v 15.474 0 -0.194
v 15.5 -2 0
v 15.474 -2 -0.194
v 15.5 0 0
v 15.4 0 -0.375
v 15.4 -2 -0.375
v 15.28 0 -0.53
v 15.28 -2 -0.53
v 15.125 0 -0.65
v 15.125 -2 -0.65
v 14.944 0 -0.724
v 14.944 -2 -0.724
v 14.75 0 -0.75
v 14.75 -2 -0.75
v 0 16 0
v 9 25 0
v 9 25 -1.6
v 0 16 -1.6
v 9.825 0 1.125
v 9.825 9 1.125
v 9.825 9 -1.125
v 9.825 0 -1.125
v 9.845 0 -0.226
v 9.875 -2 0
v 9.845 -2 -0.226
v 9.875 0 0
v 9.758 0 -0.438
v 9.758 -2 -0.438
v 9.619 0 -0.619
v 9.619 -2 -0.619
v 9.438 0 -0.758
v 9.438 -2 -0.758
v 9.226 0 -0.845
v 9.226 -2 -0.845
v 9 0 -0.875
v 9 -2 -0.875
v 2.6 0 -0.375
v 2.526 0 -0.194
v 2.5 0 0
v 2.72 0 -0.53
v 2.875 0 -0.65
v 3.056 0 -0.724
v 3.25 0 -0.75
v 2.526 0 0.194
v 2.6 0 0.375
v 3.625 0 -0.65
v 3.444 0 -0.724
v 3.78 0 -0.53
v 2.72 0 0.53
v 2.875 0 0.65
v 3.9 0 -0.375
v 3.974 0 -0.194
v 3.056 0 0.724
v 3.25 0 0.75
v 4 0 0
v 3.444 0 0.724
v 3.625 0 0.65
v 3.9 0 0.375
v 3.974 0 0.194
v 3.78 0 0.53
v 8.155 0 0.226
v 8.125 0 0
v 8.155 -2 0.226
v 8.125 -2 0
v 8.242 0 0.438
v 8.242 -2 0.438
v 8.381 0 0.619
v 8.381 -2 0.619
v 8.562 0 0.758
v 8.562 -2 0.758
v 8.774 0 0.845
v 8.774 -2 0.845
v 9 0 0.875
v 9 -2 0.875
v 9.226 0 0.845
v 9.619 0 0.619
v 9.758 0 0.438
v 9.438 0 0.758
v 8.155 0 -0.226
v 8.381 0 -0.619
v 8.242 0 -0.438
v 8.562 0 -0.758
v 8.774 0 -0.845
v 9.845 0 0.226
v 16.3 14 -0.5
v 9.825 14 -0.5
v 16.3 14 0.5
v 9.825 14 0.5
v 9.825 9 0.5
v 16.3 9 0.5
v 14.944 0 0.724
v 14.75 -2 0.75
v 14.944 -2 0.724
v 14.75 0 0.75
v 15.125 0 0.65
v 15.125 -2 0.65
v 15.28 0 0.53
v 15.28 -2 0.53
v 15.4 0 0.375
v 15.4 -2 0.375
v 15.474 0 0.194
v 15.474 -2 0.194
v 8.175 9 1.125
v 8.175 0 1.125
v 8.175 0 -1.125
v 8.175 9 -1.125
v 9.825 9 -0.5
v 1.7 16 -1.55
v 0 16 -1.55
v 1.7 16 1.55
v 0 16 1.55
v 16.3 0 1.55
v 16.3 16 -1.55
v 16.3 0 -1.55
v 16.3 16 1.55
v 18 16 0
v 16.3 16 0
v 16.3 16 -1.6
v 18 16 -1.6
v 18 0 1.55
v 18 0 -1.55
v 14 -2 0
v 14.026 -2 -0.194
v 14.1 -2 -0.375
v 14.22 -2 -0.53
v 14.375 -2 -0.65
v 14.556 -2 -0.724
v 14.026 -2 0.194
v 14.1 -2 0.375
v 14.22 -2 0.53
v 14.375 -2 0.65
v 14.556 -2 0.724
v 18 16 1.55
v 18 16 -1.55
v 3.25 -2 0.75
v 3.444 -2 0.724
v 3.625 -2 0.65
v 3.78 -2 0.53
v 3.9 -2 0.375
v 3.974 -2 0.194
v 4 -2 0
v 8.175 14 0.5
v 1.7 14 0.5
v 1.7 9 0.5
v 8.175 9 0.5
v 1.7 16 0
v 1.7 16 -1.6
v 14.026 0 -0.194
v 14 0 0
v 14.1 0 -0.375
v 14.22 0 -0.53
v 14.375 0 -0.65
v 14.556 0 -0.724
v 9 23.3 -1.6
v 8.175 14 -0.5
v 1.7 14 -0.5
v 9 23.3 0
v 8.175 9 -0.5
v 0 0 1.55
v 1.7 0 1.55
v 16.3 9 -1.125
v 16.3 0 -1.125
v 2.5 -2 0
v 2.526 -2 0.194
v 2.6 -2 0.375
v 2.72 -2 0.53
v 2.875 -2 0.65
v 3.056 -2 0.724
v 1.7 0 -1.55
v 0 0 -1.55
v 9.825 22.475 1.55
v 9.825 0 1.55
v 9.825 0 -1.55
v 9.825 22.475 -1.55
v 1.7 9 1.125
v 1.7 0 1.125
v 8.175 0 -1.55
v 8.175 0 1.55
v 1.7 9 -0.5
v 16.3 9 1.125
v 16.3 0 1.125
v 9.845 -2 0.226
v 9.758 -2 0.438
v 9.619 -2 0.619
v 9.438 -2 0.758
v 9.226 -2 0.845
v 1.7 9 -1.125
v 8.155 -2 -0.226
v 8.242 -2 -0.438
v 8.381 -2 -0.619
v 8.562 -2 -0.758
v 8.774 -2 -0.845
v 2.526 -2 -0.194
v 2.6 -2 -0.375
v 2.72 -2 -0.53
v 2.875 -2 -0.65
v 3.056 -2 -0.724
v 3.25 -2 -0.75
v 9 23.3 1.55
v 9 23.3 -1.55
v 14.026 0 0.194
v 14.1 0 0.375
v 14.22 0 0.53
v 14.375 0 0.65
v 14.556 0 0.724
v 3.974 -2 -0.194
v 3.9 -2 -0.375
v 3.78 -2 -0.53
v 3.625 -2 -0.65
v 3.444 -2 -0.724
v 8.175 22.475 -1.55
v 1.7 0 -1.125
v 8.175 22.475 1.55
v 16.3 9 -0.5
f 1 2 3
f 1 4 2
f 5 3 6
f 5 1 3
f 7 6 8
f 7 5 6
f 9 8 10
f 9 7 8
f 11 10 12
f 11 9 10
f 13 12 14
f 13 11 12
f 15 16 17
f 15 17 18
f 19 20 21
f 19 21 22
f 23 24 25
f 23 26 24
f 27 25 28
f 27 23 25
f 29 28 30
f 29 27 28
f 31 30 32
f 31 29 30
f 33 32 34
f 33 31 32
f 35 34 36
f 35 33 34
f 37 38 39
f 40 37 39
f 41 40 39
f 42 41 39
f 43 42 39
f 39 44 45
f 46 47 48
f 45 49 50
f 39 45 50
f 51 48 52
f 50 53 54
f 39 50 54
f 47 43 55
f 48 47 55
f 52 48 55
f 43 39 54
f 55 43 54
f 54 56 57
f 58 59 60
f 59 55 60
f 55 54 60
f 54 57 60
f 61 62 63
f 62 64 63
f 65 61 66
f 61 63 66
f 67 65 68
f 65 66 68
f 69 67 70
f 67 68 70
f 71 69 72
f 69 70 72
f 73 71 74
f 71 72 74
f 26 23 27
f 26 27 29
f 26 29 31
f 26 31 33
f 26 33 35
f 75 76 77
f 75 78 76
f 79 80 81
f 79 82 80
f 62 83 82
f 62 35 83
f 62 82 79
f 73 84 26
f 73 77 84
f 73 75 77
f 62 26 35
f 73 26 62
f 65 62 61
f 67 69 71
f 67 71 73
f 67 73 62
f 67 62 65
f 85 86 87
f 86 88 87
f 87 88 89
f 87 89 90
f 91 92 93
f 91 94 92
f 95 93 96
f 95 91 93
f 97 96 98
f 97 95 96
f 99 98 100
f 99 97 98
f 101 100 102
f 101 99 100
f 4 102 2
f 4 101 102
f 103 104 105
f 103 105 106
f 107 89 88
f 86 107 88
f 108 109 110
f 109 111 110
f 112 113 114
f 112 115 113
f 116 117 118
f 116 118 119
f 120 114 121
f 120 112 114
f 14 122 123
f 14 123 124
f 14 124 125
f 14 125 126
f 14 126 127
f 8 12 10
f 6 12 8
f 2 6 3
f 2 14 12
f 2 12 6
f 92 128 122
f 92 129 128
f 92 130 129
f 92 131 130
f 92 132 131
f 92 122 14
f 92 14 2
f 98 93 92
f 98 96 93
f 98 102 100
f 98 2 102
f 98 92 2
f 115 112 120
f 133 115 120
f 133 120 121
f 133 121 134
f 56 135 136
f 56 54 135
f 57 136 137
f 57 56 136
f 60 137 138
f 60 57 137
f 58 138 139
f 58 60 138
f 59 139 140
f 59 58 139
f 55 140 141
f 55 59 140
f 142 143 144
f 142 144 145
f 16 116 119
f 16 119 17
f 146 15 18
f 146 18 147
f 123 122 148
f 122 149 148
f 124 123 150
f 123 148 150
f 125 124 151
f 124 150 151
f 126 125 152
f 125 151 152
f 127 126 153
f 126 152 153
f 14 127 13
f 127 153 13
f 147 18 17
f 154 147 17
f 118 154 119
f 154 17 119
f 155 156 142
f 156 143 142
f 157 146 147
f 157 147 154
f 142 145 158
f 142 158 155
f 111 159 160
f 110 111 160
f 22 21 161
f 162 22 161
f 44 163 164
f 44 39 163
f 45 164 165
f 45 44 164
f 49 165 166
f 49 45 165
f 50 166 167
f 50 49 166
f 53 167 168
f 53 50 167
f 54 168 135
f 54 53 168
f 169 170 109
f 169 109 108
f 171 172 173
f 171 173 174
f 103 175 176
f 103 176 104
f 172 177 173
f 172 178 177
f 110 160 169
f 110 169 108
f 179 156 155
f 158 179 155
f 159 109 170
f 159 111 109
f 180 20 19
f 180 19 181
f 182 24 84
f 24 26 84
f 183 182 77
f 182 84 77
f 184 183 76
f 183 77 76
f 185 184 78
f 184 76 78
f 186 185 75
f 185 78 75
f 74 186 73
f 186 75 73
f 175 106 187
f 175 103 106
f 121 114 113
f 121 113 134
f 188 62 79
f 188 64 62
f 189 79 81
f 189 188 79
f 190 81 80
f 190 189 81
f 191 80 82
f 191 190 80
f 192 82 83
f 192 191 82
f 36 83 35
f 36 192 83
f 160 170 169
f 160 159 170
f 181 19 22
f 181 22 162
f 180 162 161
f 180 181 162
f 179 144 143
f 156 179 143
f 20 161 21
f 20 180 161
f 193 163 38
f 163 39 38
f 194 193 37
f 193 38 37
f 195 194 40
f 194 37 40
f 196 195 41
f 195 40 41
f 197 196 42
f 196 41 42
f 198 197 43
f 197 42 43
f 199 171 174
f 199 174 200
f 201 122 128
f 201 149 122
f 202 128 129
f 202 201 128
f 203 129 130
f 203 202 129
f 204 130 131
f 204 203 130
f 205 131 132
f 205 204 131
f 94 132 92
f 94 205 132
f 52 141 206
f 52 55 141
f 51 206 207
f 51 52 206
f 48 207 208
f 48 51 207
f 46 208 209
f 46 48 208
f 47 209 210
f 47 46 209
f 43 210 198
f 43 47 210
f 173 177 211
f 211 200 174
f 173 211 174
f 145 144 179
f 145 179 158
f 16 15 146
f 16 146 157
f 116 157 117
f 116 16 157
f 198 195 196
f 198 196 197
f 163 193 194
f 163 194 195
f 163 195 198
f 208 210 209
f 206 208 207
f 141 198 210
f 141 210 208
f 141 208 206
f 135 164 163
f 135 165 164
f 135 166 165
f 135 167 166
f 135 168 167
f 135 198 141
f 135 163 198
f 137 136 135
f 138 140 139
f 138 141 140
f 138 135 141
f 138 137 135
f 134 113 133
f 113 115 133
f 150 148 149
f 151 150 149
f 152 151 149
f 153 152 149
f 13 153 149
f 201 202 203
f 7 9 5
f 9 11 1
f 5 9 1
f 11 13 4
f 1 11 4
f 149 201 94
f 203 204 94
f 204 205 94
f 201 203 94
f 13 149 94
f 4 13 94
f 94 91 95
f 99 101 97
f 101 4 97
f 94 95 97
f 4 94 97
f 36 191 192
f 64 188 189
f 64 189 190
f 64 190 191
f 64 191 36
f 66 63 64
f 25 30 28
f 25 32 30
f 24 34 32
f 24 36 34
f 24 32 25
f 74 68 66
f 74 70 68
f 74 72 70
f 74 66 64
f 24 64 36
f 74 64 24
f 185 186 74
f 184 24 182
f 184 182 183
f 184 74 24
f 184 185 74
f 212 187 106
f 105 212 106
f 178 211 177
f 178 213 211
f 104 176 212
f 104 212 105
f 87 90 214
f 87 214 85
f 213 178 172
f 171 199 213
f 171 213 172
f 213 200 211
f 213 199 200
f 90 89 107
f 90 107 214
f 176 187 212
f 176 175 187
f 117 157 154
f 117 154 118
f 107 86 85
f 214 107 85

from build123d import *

# Parameters (mm, degrees)
F0_W     = 1.7
F0_H     = 9
F0_H_2   = 2
F0_H_3   = 5
F1_DEPTH = 1.55
F0_W_2   = 0.825
F2_DEPTH = 1.125
F3_DEPTH = 1.6
F0_W_3   = 6.475
F4_DEPTH = 0.5
F0_W_4   = 1.5
F5_DEPTH = 0.75
F6_DEPTH = 0.875
F7_R     = 0.87499
F8_R     = 0.74999
F8_2_R   = 0.74999


# Not quite as in the source:
# - a fillet or chamfer is up to 0.001 mm smaller than in the source, because OpenCascade refuses the exact size


with BuildPart() as f1:
    # F0 (on Top) → F1 (new body, symmetric)
    with BuildSketch(Plane.XY):
        with Locations((0.85, 4.5)):
            Rectangle(F0_W, F0_H)
        with Locations((0.85, 15)):
            Rectangle(F0_W, F0_H_2)
        with Locations((0.85, 11.5)):
            Rectangle(F0_W, F0_H_3)
    extrude(amount=F1_DEPTH, both=True)


with BuildPart() as f1b:
    # F0 (on Top) → F1, piece 2 (new body, symmetric)
    with BuildSketch(Plane.XY):
        with Locations((17.15, 4.5)):
            Rectangle(F0_W, F0_H)
        with Locations((17.15, 15)):
            Rectangle(F0_W, F0_H_2)
        with Locations((17.15, 11.5)):
            Rectangle(F0_W, F0_H_3)
    extrude(amount=F1_DEPTH, both=True)


with BuildPart() as f1c:
    # F0 (on Top) → F1, piece 3 (new body, symmetric)
    with BuildSketch(Plane.XY):
        with Locations((8.5875, 4.5)):
            Rectangle(F0_W_2, F0_H)
        with Locations((9.4125, 4.5)):
            Rectangle(F0_W_2, F0_H)
        with Locations((9.4125, 11.5)):
            Rectangle(F0_W_2, F0_H_3)
        with Locations((8.5875, 11.5)):
            Rectangle(F0_W_2, F0_H_3)
        Polygon((8.175, 22.475), (8.175, 14), (9, 14), (9, 23.3), align=None)
        Polygon((9, 23.3), (9, 14), (9.825, 14), (9.825, 22.475), align=None)
    extrude(amount=F1_DEPTH, both=True)


with BuildPart() as f2:
    # F0 (on Top) → F2 (new body, symmetric)
    with BuildSketch(Plane.XY):
        Polygon((1.7, 9), (1.7, 0), (2.5, 0), (4, 0), (8.125, 0), (8.175, 0), (8.175, 9), align=None)
    extrude(amount=F2_DEPTH, both=True)


with BuildPart() as f2b:
    # F0 (on Top) → F2, piece 2 (new body, symmetric)
    with BuildSketch(Plane.XY):
        Polygon((16.3, 9), (9.825, 9), (9.825, 0), (9.875, 0), (14, 0), (15.5, 0), (16.3, 0), align=None)
    extrude(amount=F2_DEPTH, both=True)


with BuildPart() as f3:
    # F0 (on Top) → F3 (new body)
    with BuildSketch(Plane.XY):
        Polygon((9, 25), (0, 16), (1.7, 16), (8.175, 22.475), (9, 23.3), align=None)
        Polygon((18, 16), (9, 25), (9, 23.3), (9.825, 22.475), (16.3, 16), align=None)
    extrude(amount=-F3_DEPTH)


with BuildPart() as f4:
    # F0 (on Top) → F4 (new body, symmetric)
    with BuildSketch(Plane.XY):
        with Locations((4.9375, 11.5)):
            Rectangle(F0_W_3, F0_H_3)
    extrude(amount=F4_DEPTH, both=True)


with BuildPart() as f4b:
    # F0 (on Top) → F4, piece 2 (new body, symmetric)
    with BuildSketch(Plane.XY):
        with Locations((13.0625, 11.5)):
            Rectangle(F0_W_3, F0_H_3)
    extrude(amount=F4_DEPTH, both=True)


with BuildPart() as f5:
    # F0 (on Top) → F5 (new body, symmetric)
    with BuildSketch(Plane.XY):
        with Locations((3.25, -1)):
            Rectangle(F0_W_4, F0_H_2)
    extrude(amount=F5_DEPTH, both=True)

    # F8#2 (radius 0.75 in the source; OpenCascade refuses exactly that, so slightly less here)
    f8_2_edges = [f5.edges().sort_by_distance(p)[0] for p in [
        (2.5, -1, 0.75),
        (4, -1, 0.75),
        (2.5, -1, -0.75),
        (4, -1, -0.75),
    ]]
    fillet(f8_2_edges, radius=F8_2_R)


with BuildPart() as f5b:
    # F0 (on Top) → F5, piece 2 (new body, symmetric)
    with BuildSketch(Plane.XY):
        with Locations((14.75, -1)):
            Rectangle(F0_W_4, F0_H_2)
    extrude(amount=F5_DEPTH, both=True)

    # F8 (radius 0.75 in the source; OpenCascade refuses exactly that, so slightly less here)
    f8_edges = [f5b.edges().sort_by_distance(p)[0] for p in [
        (14, -1, 0.75),
        (15.5, -1, 0.75),
        (15.5, -1, -0.75),
        (14, -1, -0.75),
    ]]
    fillet(f8_edges, radius=F8_R)


with BuildPart() as f6:
    # F0 (on Top) → F6 (new body, symmetric)
    with BuildSketch(Plane.XY):
        Polygon((8.175, 0), (8.125, 0), (8.125, -2), (9.875, -2), (9.875, 0), (9.825, 0), (9, 0), align=None)
    extrude(amount=F6_DEPTH, both=True)

    # F7 (radius 0.875 in the source; OpenCascade refuses exactly that, so slightly less here)
    f7_edges = [f6.edges().sort_by_distance(p)[0] for p in [
        (9.875, -1, -0.875),
        (8.125, -1, -0.875),
        (9.875, -1, 0.875),
        (8.125, -1, 0.875),
    ]]
    fillet(f7_edges, radius=F7_R)


solid = Compound([f1.part, f1b.part, f1c.part, f2.part, f2b.part, f3.part, f4.part, f4b.part, f5.part, f5b.part, f6.part])
